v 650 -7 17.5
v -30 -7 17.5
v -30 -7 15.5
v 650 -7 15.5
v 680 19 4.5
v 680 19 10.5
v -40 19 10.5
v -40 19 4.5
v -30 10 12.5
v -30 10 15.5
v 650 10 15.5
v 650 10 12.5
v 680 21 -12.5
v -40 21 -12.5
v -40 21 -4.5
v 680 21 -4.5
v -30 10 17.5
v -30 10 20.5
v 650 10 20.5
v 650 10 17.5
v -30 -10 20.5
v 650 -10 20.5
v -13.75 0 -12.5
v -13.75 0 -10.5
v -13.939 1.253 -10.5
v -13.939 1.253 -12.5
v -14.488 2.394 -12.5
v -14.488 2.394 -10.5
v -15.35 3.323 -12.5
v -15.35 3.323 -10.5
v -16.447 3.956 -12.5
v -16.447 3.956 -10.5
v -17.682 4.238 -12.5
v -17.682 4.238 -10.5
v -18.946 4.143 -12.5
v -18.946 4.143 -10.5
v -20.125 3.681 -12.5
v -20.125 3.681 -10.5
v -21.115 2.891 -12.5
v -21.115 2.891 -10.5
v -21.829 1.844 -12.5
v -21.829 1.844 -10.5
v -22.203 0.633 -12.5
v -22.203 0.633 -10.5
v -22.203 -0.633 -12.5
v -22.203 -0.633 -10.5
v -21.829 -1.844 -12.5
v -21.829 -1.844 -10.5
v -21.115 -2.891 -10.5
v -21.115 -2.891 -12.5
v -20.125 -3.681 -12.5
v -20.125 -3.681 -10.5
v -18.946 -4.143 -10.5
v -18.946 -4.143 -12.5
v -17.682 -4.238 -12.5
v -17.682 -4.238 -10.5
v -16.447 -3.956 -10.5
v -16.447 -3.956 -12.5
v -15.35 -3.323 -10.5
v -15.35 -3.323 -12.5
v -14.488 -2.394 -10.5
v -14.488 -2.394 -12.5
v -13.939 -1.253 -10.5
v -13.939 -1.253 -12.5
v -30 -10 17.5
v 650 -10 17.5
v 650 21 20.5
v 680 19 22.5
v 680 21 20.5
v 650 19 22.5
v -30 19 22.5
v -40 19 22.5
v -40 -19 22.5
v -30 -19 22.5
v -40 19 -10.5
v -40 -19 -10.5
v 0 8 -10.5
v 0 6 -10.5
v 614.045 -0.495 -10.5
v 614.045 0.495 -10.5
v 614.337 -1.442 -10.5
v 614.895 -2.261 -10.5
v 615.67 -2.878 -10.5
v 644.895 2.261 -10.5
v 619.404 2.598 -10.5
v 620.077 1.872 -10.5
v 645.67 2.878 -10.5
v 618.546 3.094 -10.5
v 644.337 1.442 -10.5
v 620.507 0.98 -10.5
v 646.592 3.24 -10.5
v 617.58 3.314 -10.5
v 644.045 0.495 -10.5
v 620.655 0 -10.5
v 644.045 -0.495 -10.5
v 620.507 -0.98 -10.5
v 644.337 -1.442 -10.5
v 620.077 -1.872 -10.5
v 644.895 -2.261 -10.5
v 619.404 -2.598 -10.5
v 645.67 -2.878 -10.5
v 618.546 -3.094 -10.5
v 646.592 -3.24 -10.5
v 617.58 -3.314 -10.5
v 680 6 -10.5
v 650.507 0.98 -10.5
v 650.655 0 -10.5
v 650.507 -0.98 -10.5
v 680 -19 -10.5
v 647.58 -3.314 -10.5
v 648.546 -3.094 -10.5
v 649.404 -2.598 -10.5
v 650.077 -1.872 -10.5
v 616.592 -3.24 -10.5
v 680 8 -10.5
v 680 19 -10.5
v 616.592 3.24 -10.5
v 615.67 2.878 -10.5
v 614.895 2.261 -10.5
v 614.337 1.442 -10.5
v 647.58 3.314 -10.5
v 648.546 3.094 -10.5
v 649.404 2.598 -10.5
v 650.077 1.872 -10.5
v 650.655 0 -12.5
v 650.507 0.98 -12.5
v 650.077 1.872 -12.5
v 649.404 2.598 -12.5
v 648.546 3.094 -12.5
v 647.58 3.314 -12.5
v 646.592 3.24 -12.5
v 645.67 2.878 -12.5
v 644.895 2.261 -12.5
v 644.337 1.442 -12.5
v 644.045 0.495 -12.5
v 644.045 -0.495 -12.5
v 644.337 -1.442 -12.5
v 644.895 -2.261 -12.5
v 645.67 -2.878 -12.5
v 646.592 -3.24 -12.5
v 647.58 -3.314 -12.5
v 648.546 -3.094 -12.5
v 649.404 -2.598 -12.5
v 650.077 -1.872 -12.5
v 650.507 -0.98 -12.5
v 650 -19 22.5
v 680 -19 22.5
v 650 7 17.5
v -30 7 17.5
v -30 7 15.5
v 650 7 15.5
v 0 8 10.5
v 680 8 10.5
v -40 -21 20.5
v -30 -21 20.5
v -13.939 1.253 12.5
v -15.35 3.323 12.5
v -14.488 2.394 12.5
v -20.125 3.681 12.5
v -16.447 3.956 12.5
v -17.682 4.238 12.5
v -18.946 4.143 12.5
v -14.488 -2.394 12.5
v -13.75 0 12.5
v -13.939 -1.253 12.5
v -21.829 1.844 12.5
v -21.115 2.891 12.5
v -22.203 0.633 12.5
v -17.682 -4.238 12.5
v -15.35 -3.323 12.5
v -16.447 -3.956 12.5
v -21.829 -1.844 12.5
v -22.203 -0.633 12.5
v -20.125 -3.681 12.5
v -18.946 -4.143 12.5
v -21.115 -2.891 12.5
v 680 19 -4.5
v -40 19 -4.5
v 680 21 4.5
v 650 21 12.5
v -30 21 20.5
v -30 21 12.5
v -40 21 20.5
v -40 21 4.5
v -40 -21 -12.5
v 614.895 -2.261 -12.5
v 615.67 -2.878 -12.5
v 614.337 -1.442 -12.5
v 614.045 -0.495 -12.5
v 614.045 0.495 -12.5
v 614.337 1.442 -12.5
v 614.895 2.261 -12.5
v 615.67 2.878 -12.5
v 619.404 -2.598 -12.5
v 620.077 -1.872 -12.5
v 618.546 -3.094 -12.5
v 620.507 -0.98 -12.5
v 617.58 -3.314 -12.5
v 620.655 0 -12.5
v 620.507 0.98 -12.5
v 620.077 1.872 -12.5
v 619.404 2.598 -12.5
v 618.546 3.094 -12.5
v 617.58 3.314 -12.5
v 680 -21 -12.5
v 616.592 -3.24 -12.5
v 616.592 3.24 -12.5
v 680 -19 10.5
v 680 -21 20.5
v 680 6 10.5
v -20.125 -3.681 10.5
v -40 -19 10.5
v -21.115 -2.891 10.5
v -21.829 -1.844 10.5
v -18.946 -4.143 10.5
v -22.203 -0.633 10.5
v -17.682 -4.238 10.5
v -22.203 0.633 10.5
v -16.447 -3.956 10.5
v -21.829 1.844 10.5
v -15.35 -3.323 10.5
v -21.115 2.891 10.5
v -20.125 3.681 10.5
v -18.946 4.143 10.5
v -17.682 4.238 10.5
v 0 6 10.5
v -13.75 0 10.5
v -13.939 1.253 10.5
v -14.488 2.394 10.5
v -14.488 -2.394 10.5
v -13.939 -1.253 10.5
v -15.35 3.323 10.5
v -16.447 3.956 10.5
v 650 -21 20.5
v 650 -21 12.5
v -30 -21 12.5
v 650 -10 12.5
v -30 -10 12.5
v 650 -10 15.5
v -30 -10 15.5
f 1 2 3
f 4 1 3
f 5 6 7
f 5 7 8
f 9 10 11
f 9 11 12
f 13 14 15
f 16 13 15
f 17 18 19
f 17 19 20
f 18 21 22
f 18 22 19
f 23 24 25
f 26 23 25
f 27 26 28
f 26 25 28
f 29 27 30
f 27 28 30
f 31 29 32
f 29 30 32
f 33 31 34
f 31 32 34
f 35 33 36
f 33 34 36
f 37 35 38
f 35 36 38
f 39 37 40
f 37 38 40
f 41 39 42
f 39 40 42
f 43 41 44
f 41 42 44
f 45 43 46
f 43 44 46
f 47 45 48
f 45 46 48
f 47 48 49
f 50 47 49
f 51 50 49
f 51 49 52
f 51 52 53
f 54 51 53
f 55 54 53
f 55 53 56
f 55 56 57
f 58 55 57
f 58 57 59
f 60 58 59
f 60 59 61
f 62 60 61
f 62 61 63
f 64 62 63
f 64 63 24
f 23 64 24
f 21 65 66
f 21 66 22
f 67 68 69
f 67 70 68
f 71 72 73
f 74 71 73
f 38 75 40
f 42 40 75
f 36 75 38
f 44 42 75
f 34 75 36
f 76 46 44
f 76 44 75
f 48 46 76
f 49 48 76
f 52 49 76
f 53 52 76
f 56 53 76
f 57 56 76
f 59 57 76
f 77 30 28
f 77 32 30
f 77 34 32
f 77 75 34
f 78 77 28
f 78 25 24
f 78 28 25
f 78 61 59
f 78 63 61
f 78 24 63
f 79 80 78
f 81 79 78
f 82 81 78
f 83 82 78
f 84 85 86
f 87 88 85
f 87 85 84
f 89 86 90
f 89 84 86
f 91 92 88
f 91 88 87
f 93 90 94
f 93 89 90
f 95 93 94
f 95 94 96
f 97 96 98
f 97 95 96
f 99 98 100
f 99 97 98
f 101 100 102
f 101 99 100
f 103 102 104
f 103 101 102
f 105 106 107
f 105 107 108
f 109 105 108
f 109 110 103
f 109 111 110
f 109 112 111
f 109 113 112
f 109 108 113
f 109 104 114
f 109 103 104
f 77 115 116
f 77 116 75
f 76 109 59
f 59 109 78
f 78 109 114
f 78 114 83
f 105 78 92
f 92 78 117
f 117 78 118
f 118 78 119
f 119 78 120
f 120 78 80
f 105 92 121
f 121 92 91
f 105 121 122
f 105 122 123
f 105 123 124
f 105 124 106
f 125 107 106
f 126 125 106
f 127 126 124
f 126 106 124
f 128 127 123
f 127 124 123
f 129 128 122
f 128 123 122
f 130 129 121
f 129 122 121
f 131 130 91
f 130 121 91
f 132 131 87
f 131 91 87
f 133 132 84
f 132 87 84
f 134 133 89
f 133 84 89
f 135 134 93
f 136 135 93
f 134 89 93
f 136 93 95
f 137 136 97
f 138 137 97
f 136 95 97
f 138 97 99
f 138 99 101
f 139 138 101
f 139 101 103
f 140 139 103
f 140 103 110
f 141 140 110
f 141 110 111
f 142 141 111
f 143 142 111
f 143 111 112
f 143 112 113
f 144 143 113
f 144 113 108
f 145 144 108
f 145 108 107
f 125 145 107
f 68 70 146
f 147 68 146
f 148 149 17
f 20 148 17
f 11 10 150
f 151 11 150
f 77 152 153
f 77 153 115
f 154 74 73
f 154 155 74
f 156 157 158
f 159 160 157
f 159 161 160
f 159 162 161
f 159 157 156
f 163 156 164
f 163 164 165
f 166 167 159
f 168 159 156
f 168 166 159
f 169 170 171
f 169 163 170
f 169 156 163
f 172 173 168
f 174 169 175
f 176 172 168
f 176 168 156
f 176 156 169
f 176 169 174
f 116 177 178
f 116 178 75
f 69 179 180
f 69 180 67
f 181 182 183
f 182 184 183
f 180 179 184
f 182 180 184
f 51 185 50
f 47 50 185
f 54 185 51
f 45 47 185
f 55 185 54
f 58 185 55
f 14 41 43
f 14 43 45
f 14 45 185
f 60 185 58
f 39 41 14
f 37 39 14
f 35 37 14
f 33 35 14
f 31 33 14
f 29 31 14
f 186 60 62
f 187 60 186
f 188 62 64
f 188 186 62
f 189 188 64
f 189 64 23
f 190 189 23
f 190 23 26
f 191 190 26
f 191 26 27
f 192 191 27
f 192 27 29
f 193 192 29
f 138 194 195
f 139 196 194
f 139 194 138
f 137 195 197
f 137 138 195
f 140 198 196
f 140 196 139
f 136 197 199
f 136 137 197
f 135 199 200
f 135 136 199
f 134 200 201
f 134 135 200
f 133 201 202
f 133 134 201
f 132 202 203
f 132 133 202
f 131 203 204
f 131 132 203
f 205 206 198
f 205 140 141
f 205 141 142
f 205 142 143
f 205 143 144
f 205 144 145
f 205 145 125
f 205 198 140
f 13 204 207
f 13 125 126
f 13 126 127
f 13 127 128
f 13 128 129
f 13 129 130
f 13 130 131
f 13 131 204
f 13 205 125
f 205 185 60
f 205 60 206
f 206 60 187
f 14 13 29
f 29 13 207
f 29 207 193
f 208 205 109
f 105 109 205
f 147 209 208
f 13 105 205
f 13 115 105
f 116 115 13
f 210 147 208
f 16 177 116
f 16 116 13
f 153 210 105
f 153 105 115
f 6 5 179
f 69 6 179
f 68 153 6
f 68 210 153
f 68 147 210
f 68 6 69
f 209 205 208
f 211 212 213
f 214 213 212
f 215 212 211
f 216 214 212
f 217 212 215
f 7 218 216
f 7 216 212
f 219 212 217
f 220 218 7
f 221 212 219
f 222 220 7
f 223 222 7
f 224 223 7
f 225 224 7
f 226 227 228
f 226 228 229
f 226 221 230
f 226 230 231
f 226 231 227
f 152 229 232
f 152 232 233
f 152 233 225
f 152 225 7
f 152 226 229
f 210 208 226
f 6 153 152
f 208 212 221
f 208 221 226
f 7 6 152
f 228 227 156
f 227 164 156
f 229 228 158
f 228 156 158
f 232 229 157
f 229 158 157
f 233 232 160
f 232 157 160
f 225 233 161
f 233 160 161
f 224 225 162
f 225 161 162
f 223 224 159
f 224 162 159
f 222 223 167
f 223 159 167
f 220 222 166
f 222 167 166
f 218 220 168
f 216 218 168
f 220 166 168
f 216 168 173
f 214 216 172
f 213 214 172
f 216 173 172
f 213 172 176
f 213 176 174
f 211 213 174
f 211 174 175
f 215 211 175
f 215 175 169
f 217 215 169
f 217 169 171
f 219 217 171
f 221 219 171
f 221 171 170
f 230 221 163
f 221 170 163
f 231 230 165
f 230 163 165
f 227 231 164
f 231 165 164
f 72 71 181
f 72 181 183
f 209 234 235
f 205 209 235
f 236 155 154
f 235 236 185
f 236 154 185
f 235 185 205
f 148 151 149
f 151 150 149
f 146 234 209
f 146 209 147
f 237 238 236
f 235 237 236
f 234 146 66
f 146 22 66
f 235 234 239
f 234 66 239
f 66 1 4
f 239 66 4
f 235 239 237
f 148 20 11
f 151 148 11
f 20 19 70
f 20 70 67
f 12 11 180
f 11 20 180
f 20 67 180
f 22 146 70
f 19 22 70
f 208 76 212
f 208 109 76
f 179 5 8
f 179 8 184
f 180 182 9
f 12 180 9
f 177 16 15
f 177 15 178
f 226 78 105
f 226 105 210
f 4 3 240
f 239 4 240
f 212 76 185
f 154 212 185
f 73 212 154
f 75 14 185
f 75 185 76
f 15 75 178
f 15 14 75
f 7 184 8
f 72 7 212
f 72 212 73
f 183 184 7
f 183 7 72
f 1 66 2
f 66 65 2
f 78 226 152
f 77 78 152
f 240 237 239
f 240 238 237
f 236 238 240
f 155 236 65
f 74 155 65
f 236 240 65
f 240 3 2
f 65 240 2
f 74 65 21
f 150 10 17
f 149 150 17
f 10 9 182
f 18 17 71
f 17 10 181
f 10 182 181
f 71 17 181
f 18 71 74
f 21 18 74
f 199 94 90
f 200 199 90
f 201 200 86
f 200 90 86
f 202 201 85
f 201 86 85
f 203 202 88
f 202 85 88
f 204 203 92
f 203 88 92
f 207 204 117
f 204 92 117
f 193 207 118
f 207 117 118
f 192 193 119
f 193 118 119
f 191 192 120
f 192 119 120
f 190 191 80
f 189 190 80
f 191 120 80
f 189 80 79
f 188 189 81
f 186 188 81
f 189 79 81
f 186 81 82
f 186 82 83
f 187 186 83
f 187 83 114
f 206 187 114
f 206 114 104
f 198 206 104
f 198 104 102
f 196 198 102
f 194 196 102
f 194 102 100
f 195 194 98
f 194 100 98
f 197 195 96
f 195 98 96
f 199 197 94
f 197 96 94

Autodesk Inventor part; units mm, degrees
ref_plane "YZ Plane" through (0, 0, 0) normal (1, 0, 0) x (0, 1, 0)
ref_plane "XZ Plane" through (0, 0, 0) normal (0, 1, 0) x (-1, 0, 0)
ref_plane "XY Plane" through (0, 0, 0) normal (0, 0, 1) x (1, 0, 0)
sketch "草图1" plane through (0, 0, 0) normal (1, 0, 0) x (0, 1, 0)
  line L0 (21, 12.5) -> (-21, 12.5)
  line L1 (-21, 12.5) -> (-21, -12.5)
  line L2 (-21, -12.5) -> (21, -12.5)
  line L3 (21, 12.5) -> (-21, -12.5) construction
  line L4 (-21, 12.5) -> (21, -12.5) construction
  line L5 (19, 10.5) -> (-19, 10.5)
  line L6 (-19, 10.5) -> (-19, -10.5)
  line L7 (-19, -10.5) -> (19, -10.5)
  line L8 (21, 4.5) -> (19, 4.5)
  line L9 (21, -4.5) -> (19, -4.5)
  line L10 (21, -12.5) -> (21, -4.5)
  line L11 (21, 4.5) -> (21, 12.5)
  line L12 (19, -10.5) -> (19, -4.5)
  line L13 (19, 4.5) -> (19, 10.5)
  line L14 (0, 10.5) -> (-2, 10.5)
  line L15 (-2, -10.5) -> (0, -10.5)
  line L16 (8, -12.5) -> (6, -12.5)
  line L17 (6, -12.5) -> (6, 12.5)
  line L18 (6, 12.5) -> (8, 12.5)
  line L19 (8, 12.5) -> (8, -12.5)
  point P0 (0, 0)
  point P1 (6, -10.5)
  point P2 (6, 10.5)
  point P3 (8, -10.5)
  point P4 (8, 10.5)
  dimension "d0" = 42
  dimension "d1" = 25
  dimension "d3" = 8
  dimension "d4" = 8
  dimension "d9" = 2
  dimension "d10" = 25
extrude "拉伸2" add sketch "草图1" along normal blind 680 contours L11 L8 L13 L5 L19 L0 | L19 L5 L17 L0 | L17 L5 L6 L7 L2 L1 L0 | L19 L7 L17 L5 | L19 L2 L17 L7 | L7 L12 L9 L10 L2 L19
sketch "草图2" plane through (0, -19, -10.5) normal (0, 0, 1) x (1, 0, 0)
  circle A0 centre (617.3314, 19) radius 3.3235 projected
  circle A1 centre (647.3314, 19) radius 3.3235 projected
  point P0 (0, 19)
extrude "拉伸3" cut sketch "草图2" against normal blind 2
sketch "草图3" plane through (0, 0, 0) normal (-1, 0, 0) x (0, 0, 1)
  line L0 (-12.5, 21) -> (-4.5, 21) projected
  line L1 (-12.5, -21) -> (-12.5, 21) projected
  line L2 (12.5, -21) -> (-12.5, -21) projected
  line L3 (12.5, 21) -> (12.5, -21) projected
  line L4 (4.5, 21) -> (12.5, 21) projected
  line L5 (4.5, 19) -> (4.5, 21) projected
  line L6 (10.5, 19) -> (4.5, 19) projected
  line L7 (10.5, 8) -> (10.5, 19) projected
  line L8 (-10.5, 8) -> (10.5, 8) projected
  line L9 (-10.5, 19) -> (-10.5, 8) projected
  line L10 (-4.5, 19) -> (-10.5, 19) projected
  line L11 (-4.5, 21) -> (-4.5, 19) projected
  line L12 (-10.5, 6) -> (-10.5, -19) projected
  line L13 (10.5, 6) -> (-10.5, 6) projected
  line L14 (10.5, -19) -> (10.5, 6) projected
  line L15 (-10.5, -19) -> (10.5, -19) projected
  line L16 (-10.5, 8) -> (-10.5, 6)
  line L17 (-10.5, 8) -> (10.5, 8) projected
  line L18 (10.5, -19) -> (10.5, 6) projected
  line L19 (10.5, 8) -> (10.5, 6)
  point P0 (0, 0)
extrude "拉伸4" add sketch "草图3" along normal blind 40 contours L0 L11 L10 L9 L16 L12 L15 L14 L19 L7 L6 L5 L4 L3 L2 L1
sketch "草图4" plane through (680, -21, 12.5) normal (0, 0, 1) x (1, 0, 0)
  circle A0 centre (-698, 21) radius 4.25
  line L0 (-720, 0) -> (-720, 42) projected
  point P0 (-680, 21)
  dimension "d17" = 8.5
  dimension "d18" = 22
extrude "拉伸5" cut sketch "草图4" against normal blind 40
sketch "草图5" plane through (-40, 0, 0) normal (-1, 0, 0) x (0, 0, 1)
  line L0 (4.5, 21) -> (12.5, 21) projected
  line L1 (12.5, 21) -> (22.5, 21)
  line L2 (22.5, 21) -> (22.5, -21)
  line L3 (22.5, -21) -> (12.5, -21)
  line L4 (12.5, -21) -> (12.5, 21)
  point P0 (0, 0)
  dimension "d21" = 10
  dimension "d22" = 42
extrude "拉伸6" add sketch "草图5" against normal blind 10
chamfer "倒角1" distance 2 angle 45 2 edges at (-35, 21, 22.5) (-35, -21, 22.5)
sketch "草图6" plane through (-30, 0, 0) normal (1, 0, 0) x (0, 0, -1)
  line L0 (-12.5, 21) -> (-12.5, -21) projected
  line L1 (-20.5, -10) -> (-20.5, 10)
  line L2 (-12.5, 10) -> (-12.5, -10)
  line L3 (-12.5, 21) -> (-20.5, 21) projected
  line L4 (-15.5, -10) -> (-15.5435, -10)
  line L5 (-15.5, -10) -> (-17.5, -10)
  line L6 (-17.5, -10) -> (-17.5, -7)
  line L7 (-17.5, -7) -> (-15.5, -7)
  line L8 (-15.5, -7) -> (-15.5, -10)
  line L9 (-15.5, 10) -> (-15.5, 7)
  line L10 (-15.5, 7) -> (-17.5, 7)
  line L11 (-17.5, 7) -> (-17.5, 10)
  line L12 (-20.5, 10) -> (-17.5, 10)
  line L13 (-15.5, 10) -> (-12.5, 10)
  line L14 (-12.5, -10) -> (-15.5, -10)
  line L15 (-17.5, -10) -> (-20.5, -10)
  point P0 (0, 0)
  dimension "d30" = 8
  dimension "d31" = 3
  dimension "d32" = 2
  dimension "d35" = 2
extrude "拉伸7" add sketch "草图6" along normal blind 680 contours L0 L14 L8 L7 L6 L15 L1 L12 L11 L10 L9 L13
sketch "草图7" plane through (650, 0, 0) normal (1, 0, 0) x (0, 0, -1)
  line L0 (-15.5, 10) -> (-12.5, 10) projected
  line L1 (-12.5, 21) -> (-12.5, 10) projected
  line L2 (-12.5, 21) -> (-20.5, 21) projected
  line L3 (-22.5, 19) -> (-20.5, 21) projected
  line L4 (-22.5, 19) -> (-22.5, -19) projected
  line L5 (-20.5, -21) -> (-22.5, -19) projected
  line L6 (-20.5, -21) -> (-12.5, -21) projected
  line L7 (-12.5, -10) -> (-12.5, -21) projected
  line L8 (-12.5, -10) -> (-15.5, -10) projected
  line L9 (-15.5, -10) -> (-15.5, -7) projected
  line L10 (-15.5, -7) -> (-17.5, -7) projected
  line L11 (-17.5, -7) -> (-17.5, -10) projected
  line L12 (-17.5, -10) -> (-20.5, -10) projected
  line L13 (-20.5, -10) -> (-20.5, 10) projected
  line L14 (-20.5, 10) -> (-17.5, 10) projected
  line L15 (-17.5, 10) -> (-17.5, 7) projected
  line L16 (-17.5, 7) -> (-15.5, 7) projected
  line L17 (-15.5, 7) -> (-15.5, 10) projected
  line L18 (-12.5, 10) -> (-12.5, -10) projected
  line L19 (-12.5, 10) -> (-15.5, 10) projected
  line L20 (-15.5, 10) -> (-15.5, 7) projected
  line L21 (-15.5, 7) -> (-17.5, 7) projected
  line L22 (-17.5, 7) -> (-17.5, 10) projected
  line L23 (-17.5, 10) -> (-20.5, 10) projected
  line L24 (-20.5, 10) -> (-20.5, -10) projected
  line L25 (-20.5, -10) -> (-17.5, -10) projected
  line L26 (-17.5, -10) -> (-17.5, -7) projected
  line L27 (-17.5, -7) -> (-15.5, -7) projected
  line L28 (-15.5, -7) -> (-15.5, -10) projected
  line L29 (-15.5, -10) -> (-12.5, -10) projected
  point P0 (0, 0)
extrude "拉伸8" add sketch "草图7" along normal blind 30
properties part number "连接桥"
